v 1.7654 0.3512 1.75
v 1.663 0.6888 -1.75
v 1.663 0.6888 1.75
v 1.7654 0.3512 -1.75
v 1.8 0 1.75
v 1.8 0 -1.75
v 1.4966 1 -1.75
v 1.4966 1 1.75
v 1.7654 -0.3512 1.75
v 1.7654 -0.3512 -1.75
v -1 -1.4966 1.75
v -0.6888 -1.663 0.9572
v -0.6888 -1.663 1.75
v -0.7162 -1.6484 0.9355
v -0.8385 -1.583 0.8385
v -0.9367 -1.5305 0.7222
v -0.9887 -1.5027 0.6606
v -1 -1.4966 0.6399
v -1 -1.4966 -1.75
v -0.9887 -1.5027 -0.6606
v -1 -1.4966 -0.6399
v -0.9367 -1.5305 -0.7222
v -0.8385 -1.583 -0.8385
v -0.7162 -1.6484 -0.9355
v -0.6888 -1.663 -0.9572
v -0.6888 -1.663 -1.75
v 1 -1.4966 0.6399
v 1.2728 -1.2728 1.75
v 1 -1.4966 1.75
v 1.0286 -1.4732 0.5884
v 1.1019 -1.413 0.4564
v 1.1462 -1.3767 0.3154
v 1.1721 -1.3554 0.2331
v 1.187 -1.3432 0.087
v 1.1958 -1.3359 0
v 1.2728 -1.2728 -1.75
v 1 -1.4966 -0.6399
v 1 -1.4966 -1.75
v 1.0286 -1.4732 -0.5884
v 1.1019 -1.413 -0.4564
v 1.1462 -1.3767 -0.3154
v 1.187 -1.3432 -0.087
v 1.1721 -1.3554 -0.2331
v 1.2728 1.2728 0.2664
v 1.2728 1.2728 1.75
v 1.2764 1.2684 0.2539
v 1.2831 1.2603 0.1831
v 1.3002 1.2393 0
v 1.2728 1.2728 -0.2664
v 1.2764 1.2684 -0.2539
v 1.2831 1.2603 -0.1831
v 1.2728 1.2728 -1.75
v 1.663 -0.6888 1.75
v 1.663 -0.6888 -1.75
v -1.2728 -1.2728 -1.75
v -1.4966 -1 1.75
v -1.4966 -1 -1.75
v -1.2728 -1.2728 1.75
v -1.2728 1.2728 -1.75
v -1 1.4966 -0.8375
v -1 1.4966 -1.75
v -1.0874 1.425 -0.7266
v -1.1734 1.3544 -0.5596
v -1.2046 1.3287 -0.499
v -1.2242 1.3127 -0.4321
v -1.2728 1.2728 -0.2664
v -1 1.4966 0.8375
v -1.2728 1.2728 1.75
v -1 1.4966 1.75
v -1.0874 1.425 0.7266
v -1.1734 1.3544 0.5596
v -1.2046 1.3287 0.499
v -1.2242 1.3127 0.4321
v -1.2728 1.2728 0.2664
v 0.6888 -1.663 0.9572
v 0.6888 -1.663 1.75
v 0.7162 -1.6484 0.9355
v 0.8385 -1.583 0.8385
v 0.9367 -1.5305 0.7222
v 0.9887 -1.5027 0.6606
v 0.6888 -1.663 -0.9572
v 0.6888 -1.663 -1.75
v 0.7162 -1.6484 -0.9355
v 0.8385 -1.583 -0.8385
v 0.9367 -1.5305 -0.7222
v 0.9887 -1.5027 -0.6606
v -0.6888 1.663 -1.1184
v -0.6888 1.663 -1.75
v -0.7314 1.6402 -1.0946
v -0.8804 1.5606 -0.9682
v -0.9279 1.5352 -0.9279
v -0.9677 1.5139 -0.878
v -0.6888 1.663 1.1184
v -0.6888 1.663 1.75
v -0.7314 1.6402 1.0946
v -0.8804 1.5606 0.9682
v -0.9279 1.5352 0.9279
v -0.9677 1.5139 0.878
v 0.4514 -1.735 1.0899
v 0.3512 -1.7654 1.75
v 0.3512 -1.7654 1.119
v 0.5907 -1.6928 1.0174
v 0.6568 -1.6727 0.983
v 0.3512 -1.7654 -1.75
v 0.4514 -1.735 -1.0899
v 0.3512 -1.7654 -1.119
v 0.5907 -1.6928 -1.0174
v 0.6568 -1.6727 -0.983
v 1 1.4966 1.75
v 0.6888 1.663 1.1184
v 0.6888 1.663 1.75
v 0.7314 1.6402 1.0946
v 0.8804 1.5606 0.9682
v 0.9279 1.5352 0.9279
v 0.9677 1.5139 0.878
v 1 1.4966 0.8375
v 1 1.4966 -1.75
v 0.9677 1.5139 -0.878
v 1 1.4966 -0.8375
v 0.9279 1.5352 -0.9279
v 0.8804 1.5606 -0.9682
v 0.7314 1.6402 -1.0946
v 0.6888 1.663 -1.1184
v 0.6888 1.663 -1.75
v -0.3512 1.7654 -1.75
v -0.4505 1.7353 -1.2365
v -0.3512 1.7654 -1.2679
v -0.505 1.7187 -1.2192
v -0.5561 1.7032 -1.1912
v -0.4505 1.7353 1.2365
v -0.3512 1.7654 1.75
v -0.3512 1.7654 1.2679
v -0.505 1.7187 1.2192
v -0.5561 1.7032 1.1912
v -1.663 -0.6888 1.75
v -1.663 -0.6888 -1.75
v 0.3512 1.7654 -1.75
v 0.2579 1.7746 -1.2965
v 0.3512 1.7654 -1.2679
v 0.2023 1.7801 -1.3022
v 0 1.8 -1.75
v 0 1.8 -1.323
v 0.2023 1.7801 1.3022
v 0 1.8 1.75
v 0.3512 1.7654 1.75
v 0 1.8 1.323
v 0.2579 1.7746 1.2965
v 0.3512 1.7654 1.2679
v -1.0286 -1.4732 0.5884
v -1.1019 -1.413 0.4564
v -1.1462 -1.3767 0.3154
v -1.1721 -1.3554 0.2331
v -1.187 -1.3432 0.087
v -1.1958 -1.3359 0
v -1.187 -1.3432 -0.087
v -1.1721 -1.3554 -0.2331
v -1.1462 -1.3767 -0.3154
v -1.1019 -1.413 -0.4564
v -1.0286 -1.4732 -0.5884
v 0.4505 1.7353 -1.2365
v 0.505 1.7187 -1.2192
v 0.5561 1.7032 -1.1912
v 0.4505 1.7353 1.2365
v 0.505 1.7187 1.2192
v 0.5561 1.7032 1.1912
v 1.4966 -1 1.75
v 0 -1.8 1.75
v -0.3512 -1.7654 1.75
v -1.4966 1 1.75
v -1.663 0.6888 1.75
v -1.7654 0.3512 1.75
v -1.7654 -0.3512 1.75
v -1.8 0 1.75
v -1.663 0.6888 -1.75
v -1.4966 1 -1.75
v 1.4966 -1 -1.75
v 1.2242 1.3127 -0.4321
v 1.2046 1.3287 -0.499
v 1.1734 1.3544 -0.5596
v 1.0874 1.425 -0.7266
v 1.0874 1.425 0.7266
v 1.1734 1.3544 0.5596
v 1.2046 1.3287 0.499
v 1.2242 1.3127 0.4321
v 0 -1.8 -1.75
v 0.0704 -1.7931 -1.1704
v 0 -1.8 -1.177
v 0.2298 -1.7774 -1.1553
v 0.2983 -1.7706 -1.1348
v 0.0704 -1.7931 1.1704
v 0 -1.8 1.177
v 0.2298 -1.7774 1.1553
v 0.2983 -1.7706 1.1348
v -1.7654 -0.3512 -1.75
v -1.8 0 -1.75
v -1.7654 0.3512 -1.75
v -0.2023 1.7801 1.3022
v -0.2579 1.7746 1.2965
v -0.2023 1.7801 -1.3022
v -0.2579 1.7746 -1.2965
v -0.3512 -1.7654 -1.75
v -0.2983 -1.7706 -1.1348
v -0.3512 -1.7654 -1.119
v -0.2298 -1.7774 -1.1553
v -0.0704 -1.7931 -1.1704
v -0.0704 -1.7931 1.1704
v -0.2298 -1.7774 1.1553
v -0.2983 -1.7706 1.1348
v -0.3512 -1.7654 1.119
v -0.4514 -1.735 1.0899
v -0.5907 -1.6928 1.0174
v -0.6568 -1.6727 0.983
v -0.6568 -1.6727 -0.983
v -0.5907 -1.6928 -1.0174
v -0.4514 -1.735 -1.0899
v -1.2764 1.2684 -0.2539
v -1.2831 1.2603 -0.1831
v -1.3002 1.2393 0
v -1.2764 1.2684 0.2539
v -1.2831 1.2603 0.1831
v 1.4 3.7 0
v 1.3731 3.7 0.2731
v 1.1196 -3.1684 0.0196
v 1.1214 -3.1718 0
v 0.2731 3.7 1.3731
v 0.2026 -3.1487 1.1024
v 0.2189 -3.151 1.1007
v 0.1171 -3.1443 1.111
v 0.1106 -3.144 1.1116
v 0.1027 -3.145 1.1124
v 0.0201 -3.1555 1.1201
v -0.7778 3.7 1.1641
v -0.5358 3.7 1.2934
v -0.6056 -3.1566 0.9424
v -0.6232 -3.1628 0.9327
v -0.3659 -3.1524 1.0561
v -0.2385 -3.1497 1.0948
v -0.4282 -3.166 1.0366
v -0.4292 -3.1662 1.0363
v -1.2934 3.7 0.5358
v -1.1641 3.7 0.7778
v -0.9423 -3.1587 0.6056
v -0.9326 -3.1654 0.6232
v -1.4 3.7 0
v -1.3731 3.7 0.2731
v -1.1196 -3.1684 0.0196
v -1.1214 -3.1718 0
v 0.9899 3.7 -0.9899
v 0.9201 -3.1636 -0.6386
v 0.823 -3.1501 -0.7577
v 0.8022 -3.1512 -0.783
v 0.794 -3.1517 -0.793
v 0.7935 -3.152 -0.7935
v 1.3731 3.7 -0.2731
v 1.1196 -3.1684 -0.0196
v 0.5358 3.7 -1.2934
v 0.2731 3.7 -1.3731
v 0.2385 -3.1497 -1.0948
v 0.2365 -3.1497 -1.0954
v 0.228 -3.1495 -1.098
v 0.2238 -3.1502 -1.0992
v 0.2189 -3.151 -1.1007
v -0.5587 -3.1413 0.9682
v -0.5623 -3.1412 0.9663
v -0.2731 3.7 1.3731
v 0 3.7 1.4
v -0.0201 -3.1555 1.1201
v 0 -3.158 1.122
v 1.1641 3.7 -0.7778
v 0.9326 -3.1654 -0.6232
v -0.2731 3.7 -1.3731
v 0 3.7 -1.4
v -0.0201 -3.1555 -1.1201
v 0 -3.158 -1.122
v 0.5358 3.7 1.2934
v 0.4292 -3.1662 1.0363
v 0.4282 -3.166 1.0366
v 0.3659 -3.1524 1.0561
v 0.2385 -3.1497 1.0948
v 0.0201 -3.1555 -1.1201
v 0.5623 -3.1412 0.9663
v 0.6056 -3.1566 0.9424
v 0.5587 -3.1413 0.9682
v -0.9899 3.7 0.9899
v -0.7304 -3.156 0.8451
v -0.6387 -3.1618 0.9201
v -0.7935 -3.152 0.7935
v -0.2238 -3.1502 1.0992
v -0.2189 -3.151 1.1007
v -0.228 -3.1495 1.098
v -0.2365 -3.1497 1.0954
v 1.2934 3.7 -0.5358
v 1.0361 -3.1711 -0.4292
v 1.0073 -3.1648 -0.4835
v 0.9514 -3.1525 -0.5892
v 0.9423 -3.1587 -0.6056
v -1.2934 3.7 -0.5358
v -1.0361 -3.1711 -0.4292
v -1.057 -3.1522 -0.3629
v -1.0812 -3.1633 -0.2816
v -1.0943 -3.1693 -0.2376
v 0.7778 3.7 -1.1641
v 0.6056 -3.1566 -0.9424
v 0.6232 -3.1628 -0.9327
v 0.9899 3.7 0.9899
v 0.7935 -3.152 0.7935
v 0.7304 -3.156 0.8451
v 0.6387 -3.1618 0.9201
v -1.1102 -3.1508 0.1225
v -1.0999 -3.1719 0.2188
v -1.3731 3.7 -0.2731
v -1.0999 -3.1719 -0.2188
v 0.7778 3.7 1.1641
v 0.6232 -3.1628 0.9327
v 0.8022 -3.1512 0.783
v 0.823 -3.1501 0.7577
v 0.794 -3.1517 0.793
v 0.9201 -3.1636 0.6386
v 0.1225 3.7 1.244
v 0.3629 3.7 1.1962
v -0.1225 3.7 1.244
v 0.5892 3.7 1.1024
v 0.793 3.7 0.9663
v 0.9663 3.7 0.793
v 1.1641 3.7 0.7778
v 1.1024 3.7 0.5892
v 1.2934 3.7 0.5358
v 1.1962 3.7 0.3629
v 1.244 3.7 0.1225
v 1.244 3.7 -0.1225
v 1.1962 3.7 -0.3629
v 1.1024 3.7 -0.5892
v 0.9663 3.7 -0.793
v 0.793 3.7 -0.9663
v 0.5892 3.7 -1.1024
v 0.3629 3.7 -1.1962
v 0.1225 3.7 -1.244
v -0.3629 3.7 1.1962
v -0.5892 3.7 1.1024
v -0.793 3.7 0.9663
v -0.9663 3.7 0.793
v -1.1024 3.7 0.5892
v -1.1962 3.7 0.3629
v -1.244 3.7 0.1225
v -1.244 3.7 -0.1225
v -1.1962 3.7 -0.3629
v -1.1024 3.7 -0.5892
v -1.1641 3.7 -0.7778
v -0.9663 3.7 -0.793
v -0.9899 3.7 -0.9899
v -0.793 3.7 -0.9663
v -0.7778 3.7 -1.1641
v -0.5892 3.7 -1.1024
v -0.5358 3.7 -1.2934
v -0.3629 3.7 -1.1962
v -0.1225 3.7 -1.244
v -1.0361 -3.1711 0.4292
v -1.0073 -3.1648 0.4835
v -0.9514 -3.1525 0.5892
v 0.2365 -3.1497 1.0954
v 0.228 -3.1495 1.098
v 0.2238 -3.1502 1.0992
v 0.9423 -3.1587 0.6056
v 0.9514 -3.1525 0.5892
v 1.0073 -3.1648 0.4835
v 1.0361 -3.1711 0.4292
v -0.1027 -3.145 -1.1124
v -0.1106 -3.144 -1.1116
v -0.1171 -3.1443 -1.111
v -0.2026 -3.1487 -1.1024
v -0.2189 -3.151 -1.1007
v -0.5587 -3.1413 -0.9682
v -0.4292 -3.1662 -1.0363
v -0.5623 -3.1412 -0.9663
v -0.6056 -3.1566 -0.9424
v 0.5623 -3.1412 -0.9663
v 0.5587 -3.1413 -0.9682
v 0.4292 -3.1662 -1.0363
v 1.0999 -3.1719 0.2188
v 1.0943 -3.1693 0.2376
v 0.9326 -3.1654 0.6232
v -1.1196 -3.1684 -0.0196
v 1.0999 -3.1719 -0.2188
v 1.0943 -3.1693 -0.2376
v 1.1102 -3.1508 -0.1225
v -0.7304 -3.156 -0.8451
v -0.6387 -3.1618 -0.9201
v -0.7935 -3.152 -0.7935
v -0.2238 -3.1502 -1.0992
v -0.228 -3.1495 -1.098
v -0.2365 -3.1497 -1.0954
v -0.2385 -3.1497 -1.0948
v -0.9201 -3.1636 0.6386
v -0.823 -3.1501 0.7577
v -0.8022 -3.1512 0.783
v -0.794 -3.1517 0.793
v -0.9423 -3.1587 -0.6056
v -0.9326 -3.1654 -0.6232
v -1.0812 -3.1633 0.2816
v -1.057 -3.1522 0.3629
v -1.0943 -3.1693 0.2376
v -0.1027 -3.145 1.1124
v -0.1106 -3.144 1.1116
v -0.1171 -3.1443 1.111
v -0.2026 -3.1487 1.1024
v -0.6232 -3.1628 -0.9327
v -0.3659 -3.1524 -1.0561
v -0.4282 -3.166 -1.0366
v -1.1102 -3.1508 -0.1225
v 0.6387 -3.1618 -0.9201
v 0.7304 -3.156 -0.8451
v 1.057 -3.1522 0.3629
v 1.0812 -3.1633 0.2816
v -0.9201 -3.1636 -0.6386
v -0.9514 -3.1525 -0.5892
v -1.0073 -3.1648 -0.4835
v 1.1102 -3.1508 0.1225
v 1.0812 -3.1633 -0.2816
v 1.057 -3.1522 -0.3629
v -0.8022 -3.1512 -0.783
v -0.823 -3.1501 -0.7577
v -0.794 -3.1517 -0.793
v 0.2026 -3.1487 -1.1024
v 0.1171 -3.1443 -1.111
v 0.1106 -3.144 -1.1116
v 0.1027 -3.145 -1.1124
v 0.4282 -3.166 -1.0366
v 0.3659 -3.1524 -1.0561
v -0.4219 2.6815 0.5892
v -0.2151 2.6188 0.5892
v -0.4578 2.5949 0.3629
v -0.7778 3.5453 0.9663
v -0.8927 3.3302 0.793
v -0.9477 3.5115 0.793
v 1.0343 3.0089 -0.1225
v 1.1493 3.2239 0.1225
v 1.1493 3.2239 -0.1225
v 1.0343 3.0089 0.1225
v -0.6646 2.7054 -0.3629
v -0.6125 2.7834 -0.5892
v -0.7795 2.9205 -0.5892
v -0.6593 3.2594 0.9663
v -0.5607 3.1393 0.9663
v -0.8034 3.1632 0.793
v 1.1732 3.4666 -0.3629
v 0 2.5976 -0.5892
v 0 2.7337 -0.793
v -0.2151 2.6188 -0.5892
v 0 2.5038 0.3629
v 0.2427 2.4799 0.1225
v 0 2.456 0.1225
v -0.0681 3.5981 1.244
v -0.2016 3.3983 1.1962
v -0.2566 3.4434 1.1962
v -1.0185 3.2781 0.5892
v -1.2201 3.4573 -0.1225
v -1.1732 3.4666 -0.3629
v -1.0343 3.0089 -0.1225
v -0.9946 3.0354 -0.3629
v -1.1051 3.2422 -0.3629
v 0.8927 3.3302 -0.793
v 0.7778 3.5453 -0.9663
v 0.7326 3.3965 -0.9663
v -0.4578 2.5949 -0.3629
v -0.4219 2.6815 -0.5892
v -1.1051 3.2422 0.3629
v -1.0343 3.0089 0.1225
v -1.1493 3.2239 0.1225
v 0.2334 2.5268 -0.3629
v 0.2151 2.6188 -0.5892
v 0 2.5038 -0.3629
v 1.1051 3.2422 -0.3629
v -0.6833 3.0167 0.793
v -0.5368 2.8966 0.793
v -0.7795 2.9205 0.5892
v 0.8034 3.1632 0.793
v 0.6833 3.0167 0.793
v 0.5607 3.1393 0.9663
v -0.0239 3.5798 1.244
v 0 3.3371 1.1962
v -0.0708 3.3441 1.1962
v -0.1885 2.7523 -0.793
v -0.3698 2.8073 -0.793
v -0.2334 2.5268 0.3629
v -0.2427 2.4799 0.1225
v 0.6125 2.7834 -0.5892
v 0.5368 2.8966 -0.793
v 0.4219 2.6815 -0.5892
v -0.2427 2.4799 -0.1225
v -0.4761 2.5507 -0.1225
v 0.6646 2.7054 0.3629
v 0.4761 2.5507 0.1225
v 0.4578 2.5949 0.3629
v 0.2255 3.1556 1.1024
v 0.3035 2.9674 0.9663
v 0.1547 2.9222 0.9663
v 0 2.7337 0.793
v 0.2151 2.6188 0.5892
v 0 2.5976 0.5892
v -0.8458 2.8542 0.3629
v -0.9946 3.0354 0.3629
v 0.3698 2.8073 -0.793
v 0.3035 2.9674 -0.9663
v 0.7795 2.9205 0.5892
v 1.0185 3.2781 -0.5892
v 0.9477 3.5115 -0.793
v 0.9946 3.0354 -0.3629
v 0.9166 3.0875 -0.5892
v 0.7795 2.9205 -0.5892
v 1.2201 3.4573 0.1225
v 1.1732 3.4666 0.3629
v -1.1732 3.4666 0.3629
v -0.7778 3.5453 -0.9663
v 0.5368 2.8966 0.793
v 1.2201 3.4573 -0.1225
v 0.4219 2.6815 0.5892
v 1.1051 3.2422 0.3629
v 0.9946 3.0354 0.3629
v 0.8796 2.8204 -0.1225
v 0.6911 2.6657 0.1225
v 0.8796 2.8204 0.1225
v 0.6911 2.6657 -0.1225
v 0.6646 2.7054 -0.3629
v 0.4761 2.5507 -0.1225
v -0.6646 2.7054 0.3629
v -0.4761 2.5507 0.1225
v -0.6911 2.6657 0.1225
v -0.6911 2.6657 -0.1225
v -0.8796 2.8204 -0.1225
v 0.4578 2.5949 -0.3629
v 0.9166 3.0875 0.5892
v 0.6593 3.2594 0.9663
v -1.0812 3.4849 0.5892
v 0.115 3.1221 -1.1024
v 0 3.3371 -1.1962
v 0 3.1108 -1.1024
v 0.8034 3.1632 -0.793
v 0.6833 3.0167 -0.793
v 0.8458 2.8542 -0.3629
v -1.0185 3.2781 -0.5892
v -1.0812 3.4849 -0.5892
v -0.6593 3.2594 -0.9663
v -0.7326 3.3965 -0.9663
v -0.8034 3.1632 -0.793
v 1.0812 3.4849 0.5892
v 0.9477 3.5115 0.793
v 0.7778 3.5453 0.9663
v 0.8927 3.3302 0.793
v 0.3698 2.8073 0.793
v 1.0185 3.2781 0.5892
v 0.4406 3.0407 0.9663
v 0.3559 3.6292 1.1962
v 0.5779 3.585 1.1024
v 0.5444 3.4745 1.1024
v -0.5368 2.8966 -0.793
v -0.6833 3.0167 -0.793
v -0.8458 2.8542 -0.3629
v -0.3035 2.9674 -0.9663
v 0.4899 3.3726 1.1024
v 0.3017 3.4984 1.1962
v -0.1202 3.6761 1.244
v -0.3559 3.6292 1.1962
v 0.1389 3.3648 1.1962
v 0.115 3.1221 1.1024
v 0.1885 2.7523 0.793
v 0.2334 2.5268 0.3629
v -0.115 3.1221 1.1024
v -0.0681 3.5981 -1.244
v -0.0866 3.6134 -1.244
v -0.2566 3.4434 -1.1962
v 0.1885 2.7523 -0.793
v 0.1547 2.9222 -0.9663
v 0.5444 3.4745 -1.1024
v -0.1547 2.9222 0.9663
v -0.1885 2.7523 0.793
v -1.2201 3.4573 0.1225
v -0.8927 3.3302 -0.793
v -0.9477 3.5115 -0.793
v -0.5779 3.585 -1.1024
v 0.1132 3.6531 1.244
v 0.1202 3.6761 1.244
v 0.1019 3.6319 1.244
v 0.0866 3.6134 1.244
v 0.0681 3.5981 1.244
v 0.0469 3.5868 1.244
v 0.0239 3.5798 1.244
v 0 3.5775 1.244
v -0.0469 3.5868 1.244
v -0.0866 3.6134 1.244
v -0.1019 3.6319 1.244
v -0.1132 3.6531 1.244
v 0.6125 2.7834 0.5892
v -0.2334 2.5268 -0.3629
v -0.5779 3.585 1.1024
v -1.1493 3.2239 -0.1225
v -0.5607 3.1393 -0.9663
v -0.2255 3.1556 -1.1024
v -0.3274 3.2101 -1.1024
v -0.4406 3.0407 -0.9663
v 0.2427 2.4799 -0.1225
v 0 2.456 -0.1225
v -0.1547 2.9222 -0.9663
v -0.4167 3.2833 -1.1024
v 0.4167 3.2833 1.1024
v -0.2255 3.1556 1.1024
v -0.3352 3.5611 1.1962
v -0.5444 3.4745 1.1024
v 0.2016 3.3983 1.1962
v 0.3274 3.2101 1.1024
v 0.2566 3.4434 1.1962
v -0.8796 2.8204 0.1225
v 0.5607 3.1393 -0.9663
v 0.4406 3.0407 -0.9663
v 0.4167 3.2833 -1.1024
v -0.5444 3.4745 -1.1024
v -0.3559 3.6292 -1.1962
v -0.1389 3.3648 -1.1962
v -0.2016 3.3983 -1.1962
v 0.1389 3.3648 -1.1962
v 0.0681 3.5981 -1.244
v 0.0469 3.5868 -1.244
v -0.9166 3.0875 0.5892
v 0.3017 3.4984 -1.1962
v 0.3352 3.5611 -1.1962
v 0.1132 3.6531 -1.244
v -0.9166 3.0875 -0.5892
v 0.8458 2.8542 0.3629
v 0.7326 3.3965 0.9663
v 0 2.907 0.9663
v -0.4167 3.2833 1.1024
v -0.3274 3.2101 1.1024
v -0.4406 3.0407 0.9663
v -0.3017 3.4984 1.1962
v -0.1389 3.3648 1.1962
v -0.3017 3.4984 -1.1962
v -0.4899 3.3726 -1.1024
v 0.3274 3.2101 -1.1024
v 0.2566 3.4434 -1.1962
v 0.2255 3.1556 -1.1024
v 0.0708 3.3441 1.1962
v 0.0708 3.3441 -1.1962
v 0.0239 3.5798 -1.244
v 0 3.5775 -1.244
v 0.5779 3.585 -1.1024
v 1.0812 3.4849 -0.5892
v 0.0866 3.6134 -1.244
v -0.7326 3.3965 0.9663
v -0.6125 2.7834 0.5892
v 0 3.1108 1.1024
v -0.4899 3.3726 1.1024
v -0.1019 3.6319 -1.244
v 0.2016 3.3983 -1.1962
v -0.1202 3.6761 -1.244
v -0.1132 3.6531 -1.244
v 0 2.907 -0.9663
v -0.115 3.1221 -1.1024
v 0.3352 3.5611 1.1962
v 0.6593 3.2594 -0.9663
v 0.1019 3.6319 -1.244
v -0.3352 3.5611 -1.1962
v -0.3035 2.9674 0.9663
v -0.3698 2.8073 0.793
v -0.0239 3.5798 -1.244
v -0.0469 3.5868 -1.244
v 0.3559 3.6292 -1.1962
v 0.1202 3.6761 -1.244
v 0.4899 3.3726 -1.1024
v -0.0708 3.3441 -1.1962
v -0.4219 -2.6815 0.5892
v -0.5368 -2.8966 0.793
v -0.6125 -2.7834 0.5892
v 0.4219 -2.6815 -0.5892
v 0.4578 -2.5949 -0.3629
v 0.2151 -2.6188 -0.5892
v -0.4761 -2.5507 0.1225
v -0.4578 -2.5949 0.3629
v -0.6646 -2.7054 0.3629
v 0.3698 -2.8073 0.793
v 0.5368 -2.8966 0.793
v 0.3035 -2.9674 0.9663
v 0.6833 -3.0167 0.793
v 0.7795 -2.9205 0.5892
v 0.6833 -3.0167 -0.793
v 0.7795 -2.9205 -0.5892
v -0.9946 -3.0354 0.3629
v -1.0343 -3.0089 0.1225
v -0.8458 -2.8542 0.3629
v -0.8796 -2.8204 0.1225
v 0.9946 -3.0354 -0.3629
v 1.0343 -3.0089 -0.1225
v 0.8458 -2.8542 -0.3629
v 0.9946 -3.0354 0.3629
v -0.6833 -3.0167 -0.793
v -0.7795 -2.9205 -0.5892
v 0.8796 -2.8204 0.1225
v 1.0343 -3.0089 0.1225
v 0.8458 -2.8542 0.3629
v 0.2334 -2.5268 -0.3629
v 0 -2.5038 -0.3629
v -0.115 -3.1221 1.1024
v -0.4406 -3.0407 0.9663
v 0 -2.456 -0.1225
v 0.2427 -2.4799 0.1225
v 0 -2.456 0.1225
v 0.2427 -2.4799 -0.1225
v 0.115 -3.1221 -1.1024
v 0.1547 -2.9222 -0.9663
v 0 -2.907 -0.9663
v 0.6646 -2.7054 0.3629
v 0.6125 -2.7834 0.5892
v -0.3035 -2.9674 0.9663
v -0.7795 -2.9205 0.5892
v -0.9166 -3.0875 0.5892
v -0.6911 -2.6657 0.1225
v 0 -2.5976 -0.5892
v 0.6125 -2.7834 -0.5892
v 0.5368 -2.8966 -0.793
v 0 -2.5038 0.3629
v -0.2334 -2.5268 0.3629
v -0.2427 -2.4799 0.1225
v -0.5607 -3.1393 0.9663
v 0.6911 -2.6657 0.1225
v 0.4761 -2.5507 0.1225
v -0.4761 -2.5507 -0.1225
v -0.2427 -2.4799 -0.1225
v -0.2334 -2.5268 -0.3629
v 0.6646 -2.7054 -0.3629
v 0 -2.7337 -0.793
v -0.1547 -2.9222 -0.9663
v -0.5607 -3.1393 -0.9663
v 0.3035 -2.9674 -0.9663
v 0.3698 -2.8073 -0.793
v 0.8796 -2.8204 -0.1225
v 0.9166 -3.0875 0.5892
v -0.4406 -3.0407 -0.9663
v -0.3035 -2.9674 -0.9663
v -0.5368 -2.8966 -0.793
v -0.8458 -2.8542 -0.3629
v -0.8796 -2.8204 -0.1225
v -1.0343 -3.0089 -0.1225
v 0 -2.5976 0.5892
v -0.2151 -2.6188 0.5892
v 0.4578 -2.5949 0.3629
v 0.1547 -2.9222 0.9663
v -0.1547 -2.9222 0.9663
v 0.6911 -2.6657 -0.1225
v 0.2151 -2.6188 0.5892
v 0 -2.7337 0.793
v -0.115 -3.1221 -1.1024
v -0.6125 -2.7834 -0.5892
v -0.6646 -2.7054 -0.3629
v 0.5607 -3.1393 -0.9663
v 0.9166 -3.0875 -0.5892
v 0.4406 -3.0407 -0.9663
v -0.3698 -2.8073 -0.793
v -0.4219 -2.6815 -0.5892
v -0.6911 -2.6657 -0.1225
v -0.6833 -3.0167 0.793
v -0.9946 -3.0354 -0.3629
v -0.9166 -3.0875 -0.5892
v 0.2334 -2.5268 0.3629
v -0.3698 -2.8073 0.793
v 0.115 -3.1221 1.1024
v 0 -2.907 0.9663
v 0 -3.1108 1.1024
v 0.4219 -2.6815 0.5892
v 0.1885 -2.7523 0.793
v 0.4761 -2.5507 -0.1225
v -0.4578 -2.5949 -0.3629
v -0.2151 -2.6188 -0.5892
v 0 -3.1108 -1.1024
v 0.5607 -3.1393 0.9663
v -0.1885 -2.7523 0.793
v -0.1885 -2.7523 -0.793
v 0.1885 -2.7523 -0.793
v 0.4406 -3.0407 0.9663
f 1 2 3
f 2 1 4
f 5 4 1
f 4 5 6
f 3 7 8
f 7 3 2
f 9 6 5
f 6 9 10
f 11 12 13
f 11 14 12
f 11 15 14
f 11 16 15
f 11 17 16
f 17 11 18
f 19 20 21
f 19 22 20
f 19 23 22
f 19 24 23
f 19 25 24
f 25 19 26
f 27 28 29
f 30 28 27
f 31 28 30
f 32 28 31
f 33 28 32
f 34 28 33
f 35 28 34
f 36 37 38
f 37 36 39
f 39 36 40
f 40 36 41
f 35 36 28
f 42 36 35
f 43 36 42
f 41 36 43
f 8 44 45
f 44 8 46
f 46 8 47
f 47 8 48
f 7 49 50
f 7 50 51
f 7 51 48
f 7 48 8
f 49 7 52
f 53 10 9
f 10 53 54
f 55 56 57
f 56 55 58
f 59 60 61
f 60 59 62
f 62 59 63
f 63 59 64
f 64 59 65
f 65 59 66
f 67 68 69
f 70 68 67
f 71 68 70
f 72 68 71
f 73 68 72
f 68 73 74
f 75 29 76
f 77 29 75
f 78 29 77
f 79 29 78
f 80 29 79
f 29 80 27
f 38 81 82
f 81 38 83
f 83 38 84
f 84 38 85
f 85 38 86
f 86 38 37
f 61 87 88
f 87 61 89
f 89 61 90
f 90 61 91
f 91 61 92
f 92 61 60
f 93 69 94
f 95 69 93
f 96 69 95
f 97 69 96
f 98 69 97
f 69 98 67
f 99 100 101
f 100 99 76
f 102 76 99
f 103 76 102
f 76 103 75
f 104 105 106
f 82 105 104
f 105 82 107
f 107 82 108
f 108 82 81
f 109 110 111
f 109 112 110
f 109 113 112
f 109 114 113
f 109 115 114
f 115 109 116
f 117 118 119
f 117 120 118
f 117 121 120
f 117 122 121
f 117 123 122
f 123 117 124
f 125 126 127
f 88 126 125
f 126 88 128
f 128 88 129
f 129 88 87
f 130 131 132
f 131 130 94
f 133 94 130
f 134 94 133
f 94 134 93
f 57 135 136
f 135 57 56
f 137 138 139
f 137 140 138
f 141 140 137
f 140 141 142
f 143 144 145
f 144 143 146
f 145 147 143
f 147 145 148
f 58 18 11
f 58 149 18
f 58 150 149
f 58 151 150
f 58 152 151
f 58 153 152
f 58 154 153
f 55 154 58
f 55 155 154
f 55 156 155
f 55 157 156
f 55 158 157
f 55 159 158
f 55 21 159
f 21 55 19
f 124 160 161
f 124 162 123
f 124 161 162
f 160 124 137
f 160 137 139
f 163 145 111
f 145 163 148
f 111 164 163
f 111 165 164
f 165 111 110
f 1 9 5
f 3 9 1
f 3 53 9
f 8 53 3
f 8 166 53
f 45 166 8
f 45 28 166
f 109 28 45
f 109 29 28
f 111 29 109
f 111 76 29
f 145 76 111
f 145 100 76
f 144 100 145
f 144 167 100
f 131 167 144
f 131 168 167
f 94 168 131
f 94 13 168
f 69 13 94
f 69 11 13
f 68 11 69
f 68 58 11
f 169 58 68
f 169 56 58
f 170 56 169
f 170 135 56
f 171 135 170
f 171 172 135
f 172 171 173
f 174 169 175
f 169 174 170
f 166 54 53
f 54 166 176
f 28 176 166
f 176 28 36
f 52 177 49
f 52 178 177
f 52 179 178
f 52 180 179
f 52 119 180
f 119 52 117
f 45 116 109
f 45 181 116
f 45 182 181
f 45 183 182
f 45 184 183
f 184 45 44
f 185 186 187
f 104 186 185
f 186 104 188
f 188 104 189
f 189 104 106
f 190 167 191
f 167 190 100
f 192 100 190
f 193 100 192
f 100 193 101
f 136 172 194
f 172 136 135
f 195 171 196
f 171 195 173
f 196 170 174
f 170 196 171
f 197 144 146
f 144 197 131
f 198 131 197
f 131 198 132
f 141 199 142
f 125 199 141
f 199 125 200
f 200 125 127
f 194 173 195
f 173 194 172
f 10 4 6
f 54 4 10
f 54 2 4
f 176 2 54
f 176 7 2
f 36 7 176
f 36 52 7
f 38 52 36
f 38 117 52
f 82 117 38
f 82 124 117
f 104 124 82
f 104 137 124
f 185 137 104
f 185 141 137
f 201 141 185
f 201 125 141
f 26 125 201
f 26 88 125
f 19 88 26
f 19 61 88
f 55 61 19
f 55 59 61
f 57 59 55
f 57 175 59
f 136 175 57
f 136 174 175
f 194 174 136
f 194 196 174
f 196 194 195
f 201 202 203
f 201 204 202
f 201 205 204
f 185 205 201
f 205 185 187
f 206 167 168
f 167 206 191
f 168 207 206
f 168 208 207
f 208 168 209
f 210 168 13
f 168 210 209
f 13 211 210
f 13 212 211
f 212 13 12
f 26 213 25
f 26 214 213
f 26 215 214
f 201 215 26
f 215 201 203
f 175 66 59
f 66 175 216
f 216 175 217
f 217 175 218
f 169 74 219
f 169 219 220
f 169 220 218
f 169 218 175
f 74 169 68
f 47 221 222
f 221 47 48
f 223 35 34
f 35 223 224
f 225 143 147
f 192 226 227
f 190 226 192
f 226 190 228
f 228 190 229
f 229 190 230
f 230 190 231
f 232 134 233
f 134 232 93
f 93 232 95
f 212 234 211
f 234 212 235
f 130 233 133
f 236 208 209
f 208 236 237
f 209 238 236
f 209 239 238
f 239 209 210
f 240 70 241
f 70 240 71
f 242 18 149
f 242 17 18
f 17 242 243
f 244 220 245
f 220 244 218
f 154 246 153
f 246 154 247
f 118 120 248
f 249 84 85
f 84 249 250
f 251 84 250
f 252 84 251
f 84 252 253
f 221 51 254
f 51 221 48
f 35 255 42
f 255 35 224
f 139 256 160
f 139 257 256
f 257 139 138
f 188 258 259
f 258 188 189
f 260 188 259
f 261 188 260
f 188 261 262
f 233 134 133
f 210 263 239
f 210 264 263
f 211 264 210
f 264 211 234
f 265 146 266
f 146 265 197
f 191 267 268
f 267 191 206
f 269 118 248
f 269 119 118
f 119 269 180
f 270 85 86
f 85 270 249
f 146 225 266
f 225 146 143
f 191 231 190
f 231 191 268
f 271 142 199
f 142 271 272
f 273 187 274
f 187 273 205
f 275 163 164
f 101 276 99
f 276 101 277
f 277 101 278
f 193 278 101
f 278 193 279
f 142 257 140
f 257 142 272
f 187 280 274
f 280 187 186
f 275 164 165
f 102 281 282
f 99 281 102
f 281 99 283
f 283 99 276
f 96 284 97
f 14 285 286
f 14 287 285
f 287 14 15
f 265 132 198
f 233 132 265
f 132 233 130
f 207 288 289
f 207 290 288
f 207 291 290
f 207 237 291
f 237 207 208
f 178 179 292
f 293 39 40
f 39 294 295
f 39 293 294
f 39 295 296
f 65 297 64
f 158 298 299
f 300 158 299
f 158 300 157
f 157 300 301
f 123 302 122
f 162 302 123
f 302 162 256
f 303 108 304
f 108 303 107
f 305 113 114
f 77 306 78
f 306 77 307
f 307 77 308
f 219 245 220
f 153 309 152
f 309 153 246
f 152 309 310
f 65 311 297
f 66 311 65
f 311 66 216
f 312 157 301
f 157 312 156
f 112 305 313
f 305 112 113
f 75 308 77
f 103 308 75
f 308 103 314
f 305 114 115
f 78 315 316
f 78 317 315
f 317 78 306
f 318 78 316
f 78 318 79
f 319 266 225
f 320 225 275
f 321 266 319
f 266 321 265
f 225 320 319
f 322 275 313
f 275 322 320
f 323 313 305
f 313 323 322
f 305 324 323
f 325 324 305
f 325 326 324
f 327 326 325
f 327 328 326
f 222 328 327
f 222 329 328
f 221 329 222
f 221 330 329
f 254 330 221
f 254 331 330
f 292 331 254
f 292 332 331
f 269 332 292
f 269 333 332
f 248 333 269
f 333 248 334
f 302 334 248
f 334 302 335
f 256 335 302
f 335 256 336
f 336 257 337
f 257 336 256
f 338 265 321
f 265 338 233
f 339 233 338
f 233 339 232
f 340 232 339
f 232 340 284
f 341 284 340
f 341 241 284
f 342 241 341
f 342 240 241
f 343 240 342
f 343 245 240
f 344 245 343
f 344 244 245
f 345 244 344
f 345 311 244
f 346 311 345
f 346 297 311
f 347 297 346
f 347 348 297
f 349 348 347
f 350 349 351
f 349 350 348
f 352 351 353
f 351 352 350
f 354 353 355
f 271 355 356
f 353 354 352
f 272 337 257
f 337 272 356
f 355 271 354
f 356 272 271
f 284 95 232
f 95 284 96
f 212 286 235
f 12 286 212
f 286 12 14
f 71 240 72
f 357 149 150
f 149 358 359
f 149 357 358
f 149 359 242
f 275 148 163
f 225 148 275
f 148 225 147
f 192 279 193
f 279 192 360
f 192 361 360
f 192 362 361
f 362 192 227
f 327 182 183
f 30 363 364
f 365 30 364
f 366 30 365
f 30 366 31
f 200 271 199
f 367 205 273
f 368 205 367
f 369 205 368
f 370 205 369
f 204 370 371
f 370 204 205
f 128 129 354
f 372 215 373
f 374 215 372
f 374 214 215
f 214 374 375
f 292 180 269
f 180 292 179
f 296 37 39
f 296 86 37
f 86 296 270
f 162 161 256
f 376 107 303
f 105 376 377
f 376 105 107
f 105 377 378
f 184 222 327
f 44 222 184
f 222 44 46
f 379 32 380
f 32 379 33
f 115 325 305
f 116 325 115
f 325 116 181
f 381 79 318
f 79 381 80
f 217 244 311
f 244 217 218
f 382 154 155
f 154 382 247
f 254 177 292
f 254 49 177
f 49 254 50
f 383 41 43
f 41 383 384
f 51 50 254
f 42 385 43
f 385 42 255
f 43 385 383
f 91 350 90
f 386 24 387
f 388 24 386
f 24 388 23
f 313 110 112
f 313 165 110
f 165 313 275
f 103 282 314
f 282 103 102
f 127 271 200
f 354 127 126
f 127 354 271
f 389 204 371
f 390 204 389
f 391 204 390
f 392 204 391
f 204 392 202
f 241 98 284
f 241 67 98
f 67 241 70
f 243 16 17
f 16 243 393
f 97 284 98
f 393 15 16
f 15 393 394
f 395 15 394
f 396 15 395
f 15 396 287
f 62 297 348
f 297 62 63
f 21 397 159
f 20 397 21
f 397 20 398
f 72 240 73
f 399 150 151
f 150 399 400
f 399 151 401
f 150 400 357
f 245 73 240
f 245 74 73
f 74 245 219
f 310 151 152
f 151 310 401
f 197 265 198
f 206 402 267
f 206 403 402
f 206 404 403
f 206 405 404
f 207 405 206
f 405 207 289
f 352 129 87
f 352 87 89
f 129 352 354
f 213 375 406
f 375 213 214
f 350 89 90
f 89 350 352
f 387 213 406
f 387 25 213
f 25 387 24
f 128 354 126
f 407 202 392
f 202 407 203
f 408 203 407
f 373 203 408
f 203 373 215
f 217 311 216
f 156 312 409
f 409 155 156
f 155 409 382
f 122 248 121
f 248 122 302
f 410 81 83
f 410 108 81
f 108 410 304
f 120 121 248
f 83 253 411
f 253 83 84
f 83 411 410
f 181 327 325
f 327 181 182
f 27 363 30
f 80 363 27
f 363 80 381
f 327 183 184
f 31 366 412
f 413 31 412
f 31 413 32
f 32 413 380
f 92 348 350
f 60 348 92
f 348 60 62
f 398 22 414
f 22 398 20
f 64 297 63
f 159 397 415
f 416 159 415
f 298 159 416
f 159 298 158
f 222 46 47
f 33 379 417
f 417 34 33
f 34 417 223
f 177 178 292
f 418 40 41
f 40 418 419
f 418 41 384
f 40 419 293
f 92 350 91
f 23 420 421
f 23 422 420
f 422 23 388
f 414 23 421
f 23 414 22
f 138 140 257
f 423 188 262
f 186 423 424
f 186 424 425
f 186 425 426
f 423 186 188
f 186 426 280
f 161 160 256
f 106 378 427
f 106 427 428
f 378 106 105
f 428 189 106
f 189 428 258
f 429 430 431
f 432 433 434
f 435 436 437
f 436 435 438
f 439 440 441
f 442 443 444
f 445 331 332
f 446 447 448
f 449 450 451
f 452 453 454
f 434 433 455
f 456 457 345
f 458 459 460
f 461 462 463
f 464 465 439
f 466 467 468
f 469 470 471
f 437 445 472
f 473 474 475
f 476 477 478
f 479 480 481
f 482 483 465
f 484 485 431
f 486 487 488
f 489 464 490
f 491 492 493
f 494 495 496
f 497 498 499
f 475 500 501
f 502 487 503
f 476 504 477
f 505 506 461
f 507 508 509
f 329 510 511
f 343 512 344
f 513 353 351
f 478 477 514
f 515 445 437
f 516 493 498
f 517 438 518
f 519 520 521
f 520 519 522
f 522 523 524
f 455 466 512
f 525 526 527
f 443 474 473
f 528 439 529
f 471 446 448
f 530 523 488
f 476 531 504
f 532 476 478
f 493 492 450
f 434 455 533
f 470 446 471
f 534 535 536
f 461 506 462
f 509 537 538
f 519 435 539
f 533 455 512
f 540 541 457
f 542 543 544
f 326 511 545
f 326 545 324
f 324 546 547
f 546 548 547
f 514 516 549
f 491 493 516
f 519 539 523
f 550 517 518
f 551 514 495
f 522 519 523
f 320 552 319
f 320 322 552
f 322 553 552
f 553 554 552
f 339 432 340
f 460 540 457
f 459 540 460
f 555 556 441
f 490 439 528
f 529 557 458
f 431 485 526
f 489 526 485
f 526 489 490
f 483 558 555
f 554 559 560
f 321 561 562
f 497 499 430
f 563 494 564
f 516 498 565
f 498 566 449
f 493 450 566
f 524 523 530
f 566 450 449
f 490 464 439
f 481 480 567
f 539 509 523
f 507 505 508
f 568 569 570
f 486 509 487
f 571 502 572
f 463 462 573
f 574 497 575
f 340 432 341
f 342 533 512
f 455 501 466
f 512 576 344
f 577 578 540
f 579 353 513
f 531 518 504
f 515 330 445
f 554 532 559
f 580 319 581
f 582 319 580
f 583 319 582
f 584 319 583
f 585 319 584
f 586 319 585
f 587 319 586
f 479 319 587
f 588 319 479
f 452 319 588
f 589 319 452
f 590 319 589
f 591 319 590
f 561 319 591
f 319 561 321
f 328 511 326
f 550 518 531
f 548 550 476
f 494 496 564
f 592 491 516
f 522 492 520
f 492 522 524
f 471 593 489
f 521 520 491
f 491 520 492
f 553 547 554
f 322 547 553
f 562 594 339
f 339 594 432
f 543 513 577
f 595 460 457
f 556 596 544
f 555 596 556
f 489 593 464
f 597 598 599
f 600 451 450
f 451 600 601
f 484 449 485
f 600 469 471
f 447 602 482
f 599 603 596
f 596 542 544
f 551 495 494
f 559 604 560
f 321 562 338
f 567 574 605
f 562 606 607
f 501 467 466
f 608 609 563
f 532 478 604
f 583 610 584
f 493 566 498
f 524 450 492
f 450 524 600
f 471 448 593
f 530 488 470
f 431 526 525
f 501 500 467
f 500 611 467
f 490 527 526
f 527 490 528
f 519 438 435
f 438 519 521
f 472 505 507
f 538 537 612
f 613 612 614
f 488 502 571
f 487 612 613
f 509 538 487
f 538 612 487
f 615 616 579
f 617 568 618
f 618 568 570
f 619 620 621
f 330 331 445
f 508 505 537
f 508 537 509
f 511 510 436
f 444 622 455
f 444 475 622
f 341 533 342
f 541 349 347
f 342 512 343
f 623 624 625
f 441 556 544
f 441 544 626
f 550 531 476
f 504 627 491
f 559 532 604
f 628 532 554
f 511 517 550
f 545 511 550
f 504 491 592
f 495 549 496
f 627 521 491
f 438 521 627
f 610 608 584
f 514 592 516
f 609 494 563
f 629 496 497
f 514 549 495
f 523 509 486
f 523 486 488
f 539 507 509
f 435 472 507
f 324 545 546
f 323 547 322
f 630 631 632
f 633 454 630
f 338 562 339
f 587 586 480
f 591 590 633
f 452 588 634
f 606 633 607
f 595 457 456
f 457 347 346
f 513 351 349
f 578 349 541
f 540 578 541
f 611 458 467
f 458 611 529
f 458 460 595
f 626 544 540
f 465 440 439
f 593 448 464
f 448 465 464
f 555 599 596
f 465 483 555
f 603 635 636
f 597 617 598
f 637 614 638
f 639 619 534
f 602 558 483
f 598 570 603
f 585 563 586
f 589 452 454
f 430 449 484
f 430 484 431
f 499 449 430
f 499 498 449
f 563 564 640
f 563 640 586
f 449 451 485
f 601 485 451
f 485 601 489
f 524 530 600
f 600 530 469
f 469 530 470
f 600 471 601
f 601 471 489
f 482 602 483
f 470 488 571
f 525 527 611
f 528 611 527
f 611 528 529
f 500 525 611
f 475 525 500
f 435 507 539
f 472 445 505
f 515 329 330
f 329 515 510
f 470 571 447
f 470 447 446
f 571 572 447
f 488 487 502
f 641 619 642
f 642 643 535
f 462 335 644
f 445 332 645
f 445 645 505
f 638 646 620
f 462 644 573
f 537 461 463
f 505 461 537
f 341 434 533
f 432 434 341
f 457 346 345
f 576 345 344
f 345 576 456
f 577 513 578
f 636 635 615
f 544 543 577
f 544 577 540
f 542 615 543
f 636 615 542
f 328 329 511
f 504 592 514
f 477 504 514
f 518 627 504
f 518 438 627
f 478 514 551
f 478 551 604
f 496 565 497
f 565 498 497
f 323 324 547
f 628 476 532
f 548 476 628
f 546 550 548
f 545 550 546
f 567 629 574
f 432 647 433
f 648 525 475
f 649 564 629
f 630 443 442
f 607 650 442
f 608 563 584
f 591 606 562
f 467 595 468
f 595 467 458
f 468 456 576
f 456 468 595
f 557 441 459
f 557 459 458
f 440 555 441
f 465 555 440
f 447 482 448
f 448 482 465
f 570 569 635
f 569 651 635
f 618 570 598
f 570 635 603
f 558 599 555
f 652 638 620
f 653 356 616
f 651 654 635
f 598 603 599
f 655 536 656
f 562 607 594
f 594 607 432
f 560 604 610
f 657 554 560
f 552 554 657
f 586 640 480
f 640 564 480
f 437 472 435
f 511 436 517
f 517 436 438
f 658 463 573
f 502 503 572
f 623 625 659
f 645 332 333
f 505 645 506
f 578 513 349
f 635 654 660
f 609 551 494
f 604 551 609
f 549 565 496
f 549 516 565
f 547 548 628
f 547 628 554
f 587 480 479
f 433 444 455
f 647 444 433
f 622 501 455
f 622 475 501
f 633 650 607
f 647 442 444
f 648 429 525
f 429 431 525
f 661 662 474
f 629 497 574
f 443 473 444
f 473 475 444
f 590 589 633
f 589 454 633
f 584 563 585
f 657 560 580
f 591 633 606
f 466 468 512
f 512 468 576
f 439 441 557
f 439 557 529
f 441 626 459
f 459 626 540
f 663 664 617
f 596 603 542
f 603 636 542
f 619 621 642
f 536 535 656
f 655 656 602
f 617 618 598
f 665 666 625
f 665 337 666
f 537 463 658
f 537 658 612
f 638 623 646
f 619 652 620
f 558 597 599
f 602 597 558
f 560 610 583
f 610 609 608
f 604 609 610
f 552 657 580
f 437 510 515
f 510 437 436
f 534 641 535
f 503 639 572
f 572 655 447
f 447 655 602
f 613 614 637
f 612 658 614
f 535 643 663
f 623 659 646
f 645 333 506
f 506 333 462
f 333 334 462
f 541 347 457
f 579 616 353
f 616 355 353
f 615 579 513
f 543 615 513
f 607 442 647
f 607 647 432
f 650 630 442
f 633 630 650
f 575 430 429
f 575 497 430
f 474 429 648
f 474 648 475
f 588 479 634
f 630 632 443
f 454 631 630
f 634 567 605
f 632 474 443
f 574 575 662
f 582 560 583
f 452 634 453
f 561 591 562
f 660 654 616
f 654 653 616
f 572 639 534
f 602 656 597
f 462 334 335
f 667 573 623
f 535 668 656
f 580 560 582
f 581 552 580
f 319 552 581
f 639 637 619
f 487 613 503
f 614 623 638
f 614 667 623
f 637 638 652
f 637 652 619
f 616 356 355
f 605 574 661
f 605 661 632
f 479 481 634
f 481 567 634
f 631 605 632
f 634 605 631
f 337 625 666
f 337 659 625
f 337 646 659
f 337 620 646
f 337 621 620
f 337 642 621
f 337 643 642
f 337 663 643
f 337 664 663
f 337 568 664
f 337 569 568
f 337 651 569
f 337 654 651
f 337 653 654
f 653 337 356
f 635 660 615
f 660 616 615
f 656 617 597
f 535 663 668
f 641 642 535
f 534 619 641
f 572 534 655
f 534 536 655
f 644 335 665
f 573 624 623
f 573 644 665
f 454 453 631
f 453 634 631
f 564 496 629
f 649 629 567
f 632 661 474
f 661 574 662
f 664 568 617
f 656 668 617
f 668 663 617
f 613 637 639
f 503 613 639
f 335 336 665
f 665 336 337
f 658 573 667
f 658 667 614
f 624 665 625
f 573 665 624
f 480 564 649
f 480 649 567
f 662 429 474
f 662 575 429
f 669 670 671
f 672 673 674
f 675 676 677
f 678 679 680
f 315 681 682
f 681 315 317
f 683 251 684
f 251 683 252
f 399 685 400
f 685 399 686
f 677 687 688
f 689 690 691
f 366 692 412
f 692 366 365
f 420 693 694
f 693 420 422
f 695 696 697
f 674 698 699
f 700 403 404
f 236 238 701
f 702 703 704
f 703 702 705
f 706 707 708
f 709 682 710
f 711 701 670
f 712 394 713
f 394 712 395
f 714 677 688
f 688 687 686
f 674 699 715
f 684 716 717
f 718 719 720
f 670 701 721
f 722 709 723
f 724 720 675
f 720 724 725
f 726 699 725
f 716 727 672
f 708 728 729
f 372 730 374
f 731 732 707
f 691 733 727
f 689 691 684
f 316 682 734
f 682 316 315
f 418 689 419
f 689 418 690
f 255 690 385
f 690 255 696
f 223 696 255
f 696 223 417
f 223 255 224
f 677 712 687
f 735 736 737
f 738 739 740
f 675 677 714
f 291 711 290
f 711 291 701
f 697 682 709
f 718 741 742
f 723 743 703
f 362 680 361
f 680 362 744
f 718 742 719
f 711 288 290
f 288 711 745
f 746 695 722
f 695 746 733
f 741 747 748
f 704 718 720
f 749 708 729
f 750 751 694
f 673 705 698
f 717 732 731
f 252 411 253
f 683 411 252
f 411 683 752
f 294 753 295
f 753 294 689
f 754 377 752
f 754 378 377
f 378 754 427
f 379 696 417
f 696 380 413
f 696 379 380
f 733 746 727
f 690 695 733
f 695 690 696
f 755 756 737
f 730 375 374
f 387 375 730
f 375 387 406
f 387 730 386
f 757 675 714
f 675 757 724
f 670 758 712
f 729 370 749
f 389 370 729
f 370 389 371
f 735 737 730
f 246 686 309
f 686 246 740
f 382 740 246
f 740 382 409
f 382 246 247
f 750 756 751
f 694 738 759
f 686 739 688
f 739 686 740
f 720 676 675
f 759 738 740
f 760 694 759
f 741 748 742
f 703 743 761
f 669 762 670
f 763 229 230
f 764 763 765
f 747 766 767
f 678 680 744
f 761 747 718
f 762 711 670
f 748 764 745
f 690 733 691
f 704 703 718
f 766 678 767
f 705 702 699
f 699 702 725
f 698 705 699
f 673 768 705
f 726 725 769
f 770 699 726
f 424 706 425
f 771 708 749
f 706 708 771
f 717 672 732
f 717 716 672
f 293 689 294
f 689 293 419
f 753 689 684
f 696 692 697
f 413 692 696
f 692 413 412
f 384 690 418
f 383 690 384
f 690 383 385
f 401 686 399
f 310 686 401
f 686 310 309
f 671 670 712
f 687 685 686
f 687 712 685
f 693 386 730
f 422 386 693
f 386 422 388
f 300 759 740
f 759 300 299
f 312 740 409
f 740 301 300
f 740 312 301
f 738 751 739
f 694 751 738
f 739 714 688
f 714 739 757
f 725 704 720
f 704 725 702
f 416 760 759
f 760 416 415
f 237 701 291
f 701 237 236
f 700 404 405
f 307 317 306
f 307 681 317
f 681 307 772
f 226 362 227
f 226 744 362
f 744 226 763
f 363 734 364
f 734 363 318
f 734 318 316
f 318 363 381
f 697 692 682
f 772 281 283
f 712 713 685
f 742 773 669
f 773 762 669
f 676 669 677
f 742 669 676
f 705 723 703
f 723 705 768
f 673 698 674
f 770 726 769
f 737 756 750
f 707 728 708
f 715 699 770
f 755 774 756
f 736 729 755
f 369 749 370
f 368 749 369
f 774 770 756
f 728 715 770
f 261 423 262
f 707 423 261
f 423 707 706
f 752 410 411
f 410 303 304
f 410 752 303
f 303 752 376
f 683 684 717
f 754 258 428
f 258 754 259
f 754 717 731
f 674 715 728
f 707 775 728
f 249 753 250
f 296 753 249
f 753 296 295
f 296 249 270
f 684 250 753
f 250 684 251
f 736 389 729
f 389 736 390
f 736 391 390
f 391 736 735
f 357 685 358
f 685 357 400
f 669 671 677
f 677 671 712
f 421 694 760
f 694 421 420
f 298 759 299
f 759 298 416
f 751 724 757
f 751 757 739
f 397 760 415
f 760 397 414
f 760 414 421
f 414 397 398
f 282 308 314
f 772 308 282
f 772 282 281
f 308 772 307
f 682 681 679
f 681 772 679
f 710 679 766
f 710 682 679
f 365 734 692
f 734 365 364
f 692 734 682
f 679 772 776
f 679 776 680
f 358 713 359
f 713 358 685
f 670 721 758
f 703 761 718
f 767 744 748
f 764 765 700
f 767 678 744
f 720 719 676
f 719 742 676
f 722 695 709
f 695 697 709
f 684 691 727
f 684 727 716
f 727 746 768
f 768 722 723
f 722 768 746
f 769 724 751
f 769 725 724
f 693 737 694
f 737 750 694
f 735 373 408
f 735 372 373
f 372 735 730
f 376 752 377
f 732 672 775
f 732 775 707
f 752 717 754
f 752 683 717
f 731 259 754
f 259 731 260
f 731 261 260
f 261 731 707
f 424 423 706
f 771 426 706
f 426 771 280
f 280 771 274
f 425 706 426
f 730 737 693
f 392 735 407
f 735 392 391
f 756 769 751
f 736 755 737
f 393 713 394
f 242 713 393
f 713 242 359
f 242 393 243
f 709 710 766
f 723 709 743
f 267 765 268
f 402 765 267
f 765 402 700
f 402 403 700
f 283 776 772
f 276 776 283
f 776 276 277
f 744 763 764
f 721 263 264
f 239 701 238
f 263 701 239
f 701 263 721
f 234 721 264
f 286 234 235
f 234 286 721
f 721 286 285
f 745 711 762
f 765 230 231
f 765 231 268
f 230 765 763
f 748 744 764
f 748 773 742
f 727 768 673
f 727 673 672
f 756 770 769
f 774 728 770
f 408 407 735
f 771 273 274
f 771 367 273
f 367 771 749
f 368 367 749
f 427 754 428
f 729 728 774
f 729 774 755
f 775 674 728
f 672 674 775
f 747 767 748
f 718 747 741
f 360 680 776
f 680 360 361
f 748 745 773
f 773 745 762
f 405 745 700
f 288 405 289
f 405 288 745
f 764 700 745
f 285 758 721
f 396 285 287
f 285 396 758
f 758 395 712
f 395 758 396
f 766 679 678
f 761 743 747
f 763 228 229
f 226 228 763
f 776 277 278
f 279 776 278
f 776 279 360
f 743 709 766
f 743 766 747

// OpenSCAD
// ==============================================================================
// 🕷️ BIOMECHANICALLY PROPORTIONED PYCNOGONID COMPONENT ENGINE
// ==============================================================================
$fn = 32;

// Target Export: "BODY_SEGMENT", "PALP_SEGMENT", "OVIGER_SEGMENT"
part_type = "BODY_SEGMENT"; 

// Anatomical Scales
base_r = 1.0;
lat_process_len = 2.2;
palp_joint_len = 1.8;
oviger_joint_len = 1.4;

module joint_socket() {
    sphere(r = base_r * 1.25);
}

module joint_ball(distance) {
    translate([0, distance, 0])
        sphere(r = base_r * 1.05);
}

// 1. Central Body Node with Pronounced Lateral Extenders
if (part_type == "BODY_SEGMENT") {
    difference() {
        union() {
            // Main spine cross-section
            cylinder(h = 3.5, r = base_r * 1.8, center = true);
            // Lateral process arms pointing outward
            rotate([90, 0, 0]) 
                cylinder(h = lat_process_len * 2 + 3.0, r1 = base_r * 1.4, r2 = base_r * 1.1, center = true);
        }
        // Deep sockets at the tips of the lateral processes for Coxa 1 connection
        translate([0, (lat_process_len + 1.5), 0]) joint_socket();
        translate([0, -(lat_process_len + 1.5), 0]) joint_socket();
    }
}

// 2. Slender, Highly Articulated Palp Segment (Sensory Appendages)
if (part_type == "PALP_SEGMENT") {
    difference() {
        union() {
            rotate([0, 90, 0])
                cylinder(h = palp_joint_len, r1 = base_r * 0.4, r2 = base_r * 0.3, center = false);
            translate([palp_joint_len, 0, 0]) sphere(r = base_r * 0.35);
        }
        rotate([0, 90, 0]) joint_socket();
    }
}

// 3. Curved Oviger Node (Egg-Carrying Appendage)
if (part_type == "OVIGER_SEGMENT") {
    difference() {
        union() {
            // Curving individual segments slightly to mimic the natural oviger hook
            rotate([5, 90, 0])
                cylinder(h = oviger_joint_len, r1 = base_r * 0.5, r2 = base_r * 0.38, center = false);
            translate([oviger_joint_len, 0, 0]) sphere(r = base_r * 0.42);
        }
        rotate([5, 90, 0]) joint_socket();
    }
}
